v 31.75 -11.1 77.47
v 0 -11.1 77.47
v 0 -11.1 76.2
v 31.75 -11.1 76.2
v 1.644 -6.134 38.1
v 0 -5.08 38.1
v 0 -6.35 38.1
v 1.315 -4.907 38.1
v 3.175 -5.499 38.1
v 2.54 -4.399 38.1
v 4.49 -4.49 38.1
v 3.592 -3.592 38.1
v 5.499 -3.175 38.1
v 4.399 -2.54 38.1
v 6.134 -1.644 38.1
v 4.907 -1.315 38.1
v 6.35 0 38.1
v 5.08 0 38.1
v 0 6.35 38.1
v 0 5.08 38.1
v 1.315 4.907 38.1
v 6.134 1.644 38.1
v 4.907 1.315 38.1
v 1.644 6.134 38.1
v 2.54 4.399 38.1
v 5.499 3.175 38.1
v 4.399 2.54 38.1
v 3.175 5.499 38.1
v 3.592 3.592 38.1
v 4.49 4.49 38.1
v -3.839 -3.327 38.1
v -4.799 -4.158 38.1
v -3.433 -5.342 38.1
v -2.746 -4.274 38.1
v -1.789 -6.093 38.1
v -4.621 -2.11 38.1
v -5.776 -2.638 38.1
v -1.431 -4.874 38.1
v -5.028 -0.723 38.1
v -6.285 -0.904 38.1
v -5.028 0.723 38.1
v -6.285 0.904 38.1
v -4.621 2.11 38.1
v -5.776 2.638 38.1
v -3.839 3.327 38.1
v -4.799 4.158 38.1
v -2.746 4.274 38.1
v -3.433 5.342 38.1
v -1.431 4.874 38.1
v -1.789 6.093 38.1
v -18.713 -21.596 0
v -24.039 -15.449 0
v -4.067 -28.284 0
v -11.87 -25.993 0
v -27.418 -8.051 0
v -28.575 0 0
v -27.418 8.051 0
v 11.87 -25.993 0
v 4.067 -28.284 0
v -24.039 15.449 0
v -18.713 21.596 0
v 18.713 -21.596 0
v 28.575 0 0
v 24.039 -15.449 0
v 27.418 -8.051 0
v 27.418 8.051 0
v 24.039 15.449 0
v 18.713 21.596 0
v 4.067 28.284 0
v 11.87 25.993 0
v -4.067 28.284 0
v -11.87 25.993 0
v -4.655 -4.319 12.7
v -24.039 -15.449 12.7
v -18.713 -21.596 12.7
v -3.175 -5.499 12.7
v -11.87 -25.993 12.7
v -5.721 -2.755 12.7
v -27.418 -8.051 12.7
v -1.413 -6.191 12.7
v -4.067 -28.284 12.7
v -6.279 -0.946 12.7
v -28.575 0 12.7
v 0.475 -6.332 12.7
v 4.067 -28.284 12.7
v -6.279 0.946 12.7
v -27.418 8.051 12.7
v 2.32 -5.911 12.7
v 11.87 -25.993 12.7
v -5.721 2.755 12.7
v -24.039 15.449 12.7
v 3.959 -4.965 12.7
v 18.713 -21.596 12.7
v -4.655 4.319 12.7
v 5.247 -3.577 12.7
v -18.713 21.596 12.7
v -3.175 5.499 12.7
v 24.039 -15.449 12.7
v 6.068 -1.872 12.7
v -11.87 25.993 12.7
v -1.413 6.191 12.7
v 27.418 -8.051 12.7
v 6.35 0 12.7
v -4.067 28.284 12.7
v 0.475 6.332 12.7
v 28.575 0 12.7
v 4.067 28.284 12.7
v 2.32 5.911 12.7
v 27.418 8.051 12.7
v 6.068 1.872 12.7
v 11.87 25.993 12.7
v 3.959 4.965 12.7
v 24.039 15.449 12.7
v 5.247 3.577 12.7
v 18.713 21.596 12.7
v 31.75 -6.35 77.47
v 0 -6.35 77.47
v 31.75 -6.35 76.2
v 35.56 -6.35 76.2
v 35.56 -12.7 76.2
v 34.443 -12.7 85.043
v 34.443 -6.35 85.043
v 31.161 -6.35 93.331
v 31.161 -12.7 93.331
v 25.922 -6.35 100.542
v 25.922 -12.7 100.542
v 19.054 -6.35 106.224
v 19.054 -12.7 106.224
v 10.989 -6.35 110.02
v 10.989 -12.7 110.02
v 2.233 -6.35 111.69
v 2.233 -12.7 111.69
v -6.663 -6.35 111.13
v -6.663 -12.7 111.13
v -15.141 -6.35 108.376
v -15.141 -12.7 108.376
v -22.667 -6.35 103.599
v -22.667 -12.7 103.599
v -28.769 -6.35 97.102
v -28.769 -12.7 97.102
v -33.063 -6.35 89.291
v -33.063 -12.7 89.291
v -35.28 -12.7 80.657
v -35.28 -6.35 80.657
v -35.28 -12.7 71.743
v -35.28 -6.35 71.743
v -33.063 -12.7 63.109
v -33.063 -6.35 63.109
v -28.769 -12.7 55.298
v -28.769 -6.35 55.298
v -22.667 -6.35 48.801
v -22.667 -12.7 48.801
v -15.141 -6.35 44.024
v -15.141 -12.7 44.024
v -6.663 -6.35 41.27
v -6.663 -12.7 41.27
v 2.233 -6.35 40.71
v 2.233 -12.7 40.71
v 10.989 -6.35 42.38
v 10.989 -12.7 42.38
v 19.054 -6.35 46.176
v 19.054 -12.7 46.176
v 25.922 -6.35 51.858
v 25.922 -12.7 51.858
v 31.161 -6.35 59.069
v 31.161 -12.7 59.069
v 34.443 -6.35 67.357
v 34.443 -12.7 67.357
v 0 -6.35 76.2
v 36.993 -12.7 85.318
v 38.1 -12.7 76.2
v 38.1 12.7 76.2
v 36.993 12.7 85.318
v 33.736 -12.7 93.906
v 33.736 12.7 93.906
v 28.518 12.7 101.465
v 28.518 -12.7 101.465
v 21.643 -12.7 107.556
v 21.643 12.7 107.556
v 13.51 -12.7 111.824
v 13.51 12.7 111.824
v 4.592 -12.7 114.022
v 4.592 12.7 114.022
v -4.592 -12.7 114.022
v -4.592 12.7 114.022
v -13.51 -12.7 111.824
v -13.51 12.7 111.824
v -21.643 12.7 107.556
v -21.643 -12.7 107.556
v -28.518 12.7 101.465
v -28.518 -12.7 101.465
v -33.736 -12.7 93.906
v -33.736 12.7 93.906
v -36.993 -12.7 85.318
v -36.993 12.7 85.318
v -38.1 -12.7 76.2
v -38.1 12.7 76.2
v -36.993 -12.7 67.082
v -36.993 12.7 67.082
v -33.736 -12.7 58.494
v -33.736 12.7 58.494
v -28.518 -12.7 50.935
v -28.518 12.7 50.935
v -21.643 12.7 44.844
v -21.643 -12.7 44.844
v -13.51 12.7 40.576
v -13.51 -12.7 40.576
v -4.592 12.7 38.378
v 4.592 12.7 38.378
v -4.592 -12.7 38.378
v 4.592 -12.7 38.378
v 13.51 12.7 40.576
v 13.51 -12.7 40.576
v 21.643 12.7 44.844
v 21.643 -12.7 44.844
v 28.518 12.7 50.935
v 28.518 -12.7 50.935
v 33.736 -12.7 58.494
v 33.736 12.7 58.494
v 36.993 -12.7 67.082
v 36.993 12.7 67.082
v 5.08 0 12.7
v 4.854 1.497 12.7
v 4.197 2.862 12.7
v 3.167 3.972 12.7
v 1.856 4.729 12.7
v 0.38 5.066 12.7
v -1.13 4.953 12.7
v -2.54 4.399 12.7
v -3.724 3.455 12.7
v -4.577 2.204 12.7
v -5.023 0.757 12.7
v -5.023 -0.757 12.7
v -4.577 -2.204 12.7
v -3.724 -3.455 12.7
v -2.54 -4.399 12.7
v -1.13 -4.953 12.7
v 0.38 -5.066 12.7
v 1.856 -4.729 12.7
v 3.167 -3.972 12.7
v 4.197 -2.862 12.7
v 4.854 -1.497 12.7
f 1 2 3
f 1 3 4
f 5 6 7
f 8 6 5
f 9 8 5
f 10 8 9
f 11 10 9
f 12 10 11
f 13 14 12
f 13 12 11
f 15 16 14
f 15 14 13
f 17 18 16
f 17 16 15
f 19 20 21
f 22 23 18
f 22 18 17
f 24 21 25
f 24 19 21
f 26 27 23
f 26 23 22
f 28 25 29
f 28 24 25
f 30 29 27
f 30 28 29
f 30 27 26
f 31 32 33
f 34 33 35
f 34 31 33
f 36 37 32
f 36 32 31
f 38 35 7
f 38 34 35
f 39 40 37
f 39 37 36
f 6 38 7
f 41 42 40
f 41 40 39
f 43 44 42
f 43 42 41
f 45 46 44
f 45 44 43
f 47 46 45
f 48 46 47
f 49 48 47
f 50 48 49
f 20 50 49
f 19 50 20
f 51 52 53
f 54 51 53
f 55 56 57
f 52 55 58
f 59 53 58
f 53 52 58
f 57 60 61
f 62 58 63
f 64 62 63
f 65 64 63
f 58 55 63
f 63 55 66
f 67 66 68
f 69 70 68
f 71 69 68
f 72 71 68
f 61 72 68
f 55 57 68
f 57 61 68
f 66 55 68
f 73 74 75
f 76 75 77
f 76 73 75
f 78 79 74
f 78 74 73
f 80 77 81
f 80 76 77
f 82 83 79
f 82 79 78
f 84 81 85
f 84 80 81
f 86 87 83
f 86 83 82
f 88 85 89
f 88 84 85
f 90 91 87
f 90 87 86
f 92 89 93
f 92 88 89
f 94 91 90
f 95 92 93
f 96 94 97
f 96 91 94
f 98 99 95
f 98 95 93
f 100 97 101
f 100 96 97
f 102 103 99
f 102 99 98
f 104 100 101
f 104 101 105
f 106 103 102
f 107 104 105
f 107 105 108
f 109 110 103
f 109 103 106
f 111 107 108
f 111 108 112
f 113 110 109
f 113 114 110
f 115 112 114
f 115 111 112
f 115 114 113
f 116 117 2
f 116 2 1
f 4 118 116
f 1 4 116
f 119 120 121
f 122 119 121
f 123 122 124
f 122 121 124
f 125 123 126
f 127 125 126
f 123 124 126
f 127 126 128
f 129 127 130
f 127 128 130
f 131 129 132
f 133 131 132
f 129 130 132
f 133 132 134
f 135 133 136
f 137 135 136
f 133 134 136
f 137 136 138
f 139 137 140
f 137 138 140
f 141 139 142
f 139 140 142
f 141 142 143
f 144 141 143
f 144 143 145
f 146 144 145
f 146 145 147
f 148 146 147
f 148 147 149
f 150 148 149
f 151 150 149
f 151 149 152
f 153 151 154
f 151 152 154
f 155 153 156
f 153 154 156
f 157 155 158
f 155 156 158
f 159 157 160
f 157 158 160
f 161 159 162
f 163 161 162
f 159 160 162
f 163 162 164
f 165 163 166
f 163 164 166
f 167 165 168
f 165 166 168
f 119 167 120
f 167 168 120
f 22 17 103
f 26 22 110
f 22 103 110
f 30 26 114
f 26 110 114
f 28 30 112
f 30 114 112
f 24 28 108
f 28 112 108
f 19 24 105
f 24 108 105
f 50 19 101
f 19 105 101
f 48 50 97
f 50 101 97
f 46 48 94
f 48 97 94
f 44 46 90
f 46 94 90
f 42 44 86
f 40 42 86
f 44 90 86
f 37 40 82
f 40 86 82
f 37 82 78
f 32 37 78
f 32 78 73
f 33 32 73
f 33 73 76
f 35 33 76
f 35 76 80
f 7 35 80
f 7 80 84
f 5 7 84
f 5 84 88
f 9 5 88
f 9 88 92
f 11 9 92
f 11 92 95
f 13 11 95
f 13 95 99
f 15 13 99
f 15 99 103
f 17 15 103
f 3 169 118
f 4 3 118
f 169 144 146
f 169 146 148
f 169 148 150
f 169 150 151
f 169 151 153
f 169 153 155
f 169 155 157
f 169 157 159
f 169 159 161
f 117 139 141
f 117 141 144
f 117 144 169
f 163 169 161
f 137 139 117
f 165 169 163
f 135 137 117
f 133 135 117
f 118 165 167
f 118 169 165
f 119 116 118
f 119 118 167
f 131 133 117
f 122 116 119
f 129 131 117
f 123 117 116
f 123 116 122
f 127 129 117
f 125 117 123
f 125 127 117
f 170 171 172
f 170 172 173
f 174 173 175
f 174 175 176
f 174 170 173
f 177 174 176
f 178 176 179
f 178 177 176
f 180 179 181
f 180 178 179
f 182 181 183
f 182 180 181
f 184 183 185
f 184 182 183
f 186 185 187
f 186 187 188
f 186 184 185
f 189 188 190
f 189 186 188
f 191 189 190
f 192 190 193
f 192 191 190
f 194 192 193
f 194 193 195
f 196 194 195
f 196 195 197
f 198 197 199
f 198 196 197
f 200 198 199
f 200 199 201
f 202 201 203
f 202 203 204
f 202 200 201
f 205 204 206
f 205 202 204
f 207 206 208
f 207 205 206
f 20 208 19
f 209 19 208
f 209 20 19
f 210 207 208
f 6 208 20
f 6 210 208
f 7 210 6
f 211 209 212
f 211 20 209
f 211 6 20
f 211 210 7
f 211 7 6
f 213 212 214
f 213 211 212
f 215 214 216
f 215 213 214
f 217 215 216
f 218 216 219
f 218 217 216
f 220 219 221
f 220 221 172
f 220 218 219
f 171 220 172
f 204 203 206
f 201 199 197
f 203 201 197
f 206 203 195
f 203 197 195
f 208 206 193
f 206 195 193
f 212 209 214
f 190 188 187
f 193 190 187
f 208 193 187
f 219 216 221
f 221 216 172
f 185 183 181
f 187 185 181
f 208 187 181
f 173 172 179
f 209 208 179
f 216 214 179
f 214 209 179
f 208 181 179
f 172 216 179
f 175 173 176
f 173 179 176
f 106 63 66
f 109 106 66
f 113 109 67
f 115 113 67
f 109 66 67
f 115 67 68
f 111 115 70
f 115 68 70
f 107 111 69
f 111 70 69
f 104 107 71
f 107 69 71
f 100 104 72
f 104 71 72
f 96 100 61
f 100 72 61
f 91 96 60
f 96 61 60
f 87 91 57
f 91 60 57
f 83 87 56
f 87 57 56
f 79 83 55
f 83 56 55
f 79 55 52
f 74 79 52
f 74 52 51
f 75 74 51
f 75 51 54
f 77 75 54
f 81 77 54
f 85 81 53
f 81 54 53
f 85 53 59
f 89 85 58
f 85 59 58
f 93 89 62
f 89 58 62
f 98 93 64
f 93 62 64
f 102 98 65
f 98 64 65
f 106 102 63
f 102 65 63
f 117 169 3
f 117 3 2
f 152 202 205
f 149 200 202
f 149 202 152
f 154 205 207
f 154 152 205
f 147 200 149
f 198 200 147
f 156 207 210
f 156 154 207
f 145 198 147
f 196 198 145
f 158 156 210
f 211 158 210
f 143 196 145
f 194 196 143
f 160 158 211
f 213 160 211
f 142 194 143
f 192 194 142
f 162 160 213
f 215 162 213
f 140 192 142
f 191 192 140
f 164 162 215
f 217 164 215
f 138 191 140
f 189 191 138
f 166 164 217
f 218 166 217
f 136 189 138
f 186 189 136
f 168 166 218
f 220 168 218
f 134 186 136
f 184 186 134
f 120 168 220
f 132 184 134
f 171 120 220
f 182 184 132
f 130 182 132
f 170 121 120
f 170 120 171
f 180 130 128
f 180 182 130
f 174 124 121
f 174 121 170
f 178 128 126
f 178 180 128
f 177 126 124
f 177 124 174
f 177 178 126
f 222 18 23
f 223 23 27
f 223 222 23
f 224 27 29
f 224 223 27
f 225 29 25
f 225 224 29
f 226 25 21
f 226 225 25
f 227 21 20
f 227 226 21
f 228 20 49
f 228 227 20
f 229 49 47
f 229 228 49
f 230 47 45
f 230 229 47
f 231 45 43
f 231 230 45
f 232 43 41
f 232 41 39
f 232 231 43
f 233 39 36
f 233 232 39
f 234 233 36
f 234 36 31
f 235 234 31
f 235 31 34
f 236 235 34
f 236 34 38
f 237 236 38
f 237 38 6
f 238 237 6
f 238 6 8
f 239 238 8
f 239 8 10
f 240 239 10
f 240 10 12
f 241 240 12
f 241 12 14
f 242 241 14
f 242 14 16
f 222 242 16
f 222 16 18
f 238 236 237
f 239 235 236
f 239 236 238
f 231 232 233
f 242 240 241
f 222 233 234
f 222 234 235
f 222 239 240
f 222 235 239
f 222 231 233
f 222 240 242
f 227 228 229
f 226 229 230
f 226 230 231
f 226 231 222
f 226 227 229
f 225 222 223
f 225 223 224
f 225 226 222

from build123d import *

# Parameters (mm, degrees)
F0_R     = 28.575
F1_DEPTH = 12.7
F2_R     = 6.35
F2_R_2   = 5.08
F3_DEPTH = 25.4
F5_DEPTH = 12.7
F6_R     = 35.56
F7_DEPTH = 6.35
F8_W     = 31.75
F8_H     = 1.27
F9_DEPTH = 4.7498


with BuildPart() as f1:
    # F0 (on Top) → F1 (new body)
    with BuildSketch(Plane.XY):
        Circle(F0_R)
    extrude(amount=F1_DEPTH)

    # F2 (on face) → F3 (join)
    with BuildSketch(Plane.XY.offset(12.7)):
        Circle(F2_R)
        Circle(F2_R_2, mode=Mode.SUBTRACT)
    extrude(amount=F3_DEPTH)

    # F4 (on Front) → F5 (join, symmetric)
    with BuildSketch(Plane.XZ):
        with BuildLine():
            ThreePointArc((0, 38.1), (26.9407683632, 49.2592316368), (38.1, 76.2))
            ThreePointArc((38.1, 76.2), (-26.9407683632, 103.1407683632), (0, 38.1))
        make_face()
    extrude(amount=F5_DEPTH, both=True)

    # F6 (on face) → F7 (cut)
    with BuildSketch(Plane.XZ.offset(12.7)):
        with Locations((0, 76.2)):
            Circle(F6_R)
    extrude(amount=-F7_DEPTH, mode=Mode.SUBTRACT)

    # F8 (on face) → F9 (join)
    with BuildSketch(Plane.XZ.offset(6.35)):
        with Locations((15.875, 76.835)):
            Rectangle(F8_W, F8_H)
    extrude(amount=F9_DEPTH)


solid = f1.part
